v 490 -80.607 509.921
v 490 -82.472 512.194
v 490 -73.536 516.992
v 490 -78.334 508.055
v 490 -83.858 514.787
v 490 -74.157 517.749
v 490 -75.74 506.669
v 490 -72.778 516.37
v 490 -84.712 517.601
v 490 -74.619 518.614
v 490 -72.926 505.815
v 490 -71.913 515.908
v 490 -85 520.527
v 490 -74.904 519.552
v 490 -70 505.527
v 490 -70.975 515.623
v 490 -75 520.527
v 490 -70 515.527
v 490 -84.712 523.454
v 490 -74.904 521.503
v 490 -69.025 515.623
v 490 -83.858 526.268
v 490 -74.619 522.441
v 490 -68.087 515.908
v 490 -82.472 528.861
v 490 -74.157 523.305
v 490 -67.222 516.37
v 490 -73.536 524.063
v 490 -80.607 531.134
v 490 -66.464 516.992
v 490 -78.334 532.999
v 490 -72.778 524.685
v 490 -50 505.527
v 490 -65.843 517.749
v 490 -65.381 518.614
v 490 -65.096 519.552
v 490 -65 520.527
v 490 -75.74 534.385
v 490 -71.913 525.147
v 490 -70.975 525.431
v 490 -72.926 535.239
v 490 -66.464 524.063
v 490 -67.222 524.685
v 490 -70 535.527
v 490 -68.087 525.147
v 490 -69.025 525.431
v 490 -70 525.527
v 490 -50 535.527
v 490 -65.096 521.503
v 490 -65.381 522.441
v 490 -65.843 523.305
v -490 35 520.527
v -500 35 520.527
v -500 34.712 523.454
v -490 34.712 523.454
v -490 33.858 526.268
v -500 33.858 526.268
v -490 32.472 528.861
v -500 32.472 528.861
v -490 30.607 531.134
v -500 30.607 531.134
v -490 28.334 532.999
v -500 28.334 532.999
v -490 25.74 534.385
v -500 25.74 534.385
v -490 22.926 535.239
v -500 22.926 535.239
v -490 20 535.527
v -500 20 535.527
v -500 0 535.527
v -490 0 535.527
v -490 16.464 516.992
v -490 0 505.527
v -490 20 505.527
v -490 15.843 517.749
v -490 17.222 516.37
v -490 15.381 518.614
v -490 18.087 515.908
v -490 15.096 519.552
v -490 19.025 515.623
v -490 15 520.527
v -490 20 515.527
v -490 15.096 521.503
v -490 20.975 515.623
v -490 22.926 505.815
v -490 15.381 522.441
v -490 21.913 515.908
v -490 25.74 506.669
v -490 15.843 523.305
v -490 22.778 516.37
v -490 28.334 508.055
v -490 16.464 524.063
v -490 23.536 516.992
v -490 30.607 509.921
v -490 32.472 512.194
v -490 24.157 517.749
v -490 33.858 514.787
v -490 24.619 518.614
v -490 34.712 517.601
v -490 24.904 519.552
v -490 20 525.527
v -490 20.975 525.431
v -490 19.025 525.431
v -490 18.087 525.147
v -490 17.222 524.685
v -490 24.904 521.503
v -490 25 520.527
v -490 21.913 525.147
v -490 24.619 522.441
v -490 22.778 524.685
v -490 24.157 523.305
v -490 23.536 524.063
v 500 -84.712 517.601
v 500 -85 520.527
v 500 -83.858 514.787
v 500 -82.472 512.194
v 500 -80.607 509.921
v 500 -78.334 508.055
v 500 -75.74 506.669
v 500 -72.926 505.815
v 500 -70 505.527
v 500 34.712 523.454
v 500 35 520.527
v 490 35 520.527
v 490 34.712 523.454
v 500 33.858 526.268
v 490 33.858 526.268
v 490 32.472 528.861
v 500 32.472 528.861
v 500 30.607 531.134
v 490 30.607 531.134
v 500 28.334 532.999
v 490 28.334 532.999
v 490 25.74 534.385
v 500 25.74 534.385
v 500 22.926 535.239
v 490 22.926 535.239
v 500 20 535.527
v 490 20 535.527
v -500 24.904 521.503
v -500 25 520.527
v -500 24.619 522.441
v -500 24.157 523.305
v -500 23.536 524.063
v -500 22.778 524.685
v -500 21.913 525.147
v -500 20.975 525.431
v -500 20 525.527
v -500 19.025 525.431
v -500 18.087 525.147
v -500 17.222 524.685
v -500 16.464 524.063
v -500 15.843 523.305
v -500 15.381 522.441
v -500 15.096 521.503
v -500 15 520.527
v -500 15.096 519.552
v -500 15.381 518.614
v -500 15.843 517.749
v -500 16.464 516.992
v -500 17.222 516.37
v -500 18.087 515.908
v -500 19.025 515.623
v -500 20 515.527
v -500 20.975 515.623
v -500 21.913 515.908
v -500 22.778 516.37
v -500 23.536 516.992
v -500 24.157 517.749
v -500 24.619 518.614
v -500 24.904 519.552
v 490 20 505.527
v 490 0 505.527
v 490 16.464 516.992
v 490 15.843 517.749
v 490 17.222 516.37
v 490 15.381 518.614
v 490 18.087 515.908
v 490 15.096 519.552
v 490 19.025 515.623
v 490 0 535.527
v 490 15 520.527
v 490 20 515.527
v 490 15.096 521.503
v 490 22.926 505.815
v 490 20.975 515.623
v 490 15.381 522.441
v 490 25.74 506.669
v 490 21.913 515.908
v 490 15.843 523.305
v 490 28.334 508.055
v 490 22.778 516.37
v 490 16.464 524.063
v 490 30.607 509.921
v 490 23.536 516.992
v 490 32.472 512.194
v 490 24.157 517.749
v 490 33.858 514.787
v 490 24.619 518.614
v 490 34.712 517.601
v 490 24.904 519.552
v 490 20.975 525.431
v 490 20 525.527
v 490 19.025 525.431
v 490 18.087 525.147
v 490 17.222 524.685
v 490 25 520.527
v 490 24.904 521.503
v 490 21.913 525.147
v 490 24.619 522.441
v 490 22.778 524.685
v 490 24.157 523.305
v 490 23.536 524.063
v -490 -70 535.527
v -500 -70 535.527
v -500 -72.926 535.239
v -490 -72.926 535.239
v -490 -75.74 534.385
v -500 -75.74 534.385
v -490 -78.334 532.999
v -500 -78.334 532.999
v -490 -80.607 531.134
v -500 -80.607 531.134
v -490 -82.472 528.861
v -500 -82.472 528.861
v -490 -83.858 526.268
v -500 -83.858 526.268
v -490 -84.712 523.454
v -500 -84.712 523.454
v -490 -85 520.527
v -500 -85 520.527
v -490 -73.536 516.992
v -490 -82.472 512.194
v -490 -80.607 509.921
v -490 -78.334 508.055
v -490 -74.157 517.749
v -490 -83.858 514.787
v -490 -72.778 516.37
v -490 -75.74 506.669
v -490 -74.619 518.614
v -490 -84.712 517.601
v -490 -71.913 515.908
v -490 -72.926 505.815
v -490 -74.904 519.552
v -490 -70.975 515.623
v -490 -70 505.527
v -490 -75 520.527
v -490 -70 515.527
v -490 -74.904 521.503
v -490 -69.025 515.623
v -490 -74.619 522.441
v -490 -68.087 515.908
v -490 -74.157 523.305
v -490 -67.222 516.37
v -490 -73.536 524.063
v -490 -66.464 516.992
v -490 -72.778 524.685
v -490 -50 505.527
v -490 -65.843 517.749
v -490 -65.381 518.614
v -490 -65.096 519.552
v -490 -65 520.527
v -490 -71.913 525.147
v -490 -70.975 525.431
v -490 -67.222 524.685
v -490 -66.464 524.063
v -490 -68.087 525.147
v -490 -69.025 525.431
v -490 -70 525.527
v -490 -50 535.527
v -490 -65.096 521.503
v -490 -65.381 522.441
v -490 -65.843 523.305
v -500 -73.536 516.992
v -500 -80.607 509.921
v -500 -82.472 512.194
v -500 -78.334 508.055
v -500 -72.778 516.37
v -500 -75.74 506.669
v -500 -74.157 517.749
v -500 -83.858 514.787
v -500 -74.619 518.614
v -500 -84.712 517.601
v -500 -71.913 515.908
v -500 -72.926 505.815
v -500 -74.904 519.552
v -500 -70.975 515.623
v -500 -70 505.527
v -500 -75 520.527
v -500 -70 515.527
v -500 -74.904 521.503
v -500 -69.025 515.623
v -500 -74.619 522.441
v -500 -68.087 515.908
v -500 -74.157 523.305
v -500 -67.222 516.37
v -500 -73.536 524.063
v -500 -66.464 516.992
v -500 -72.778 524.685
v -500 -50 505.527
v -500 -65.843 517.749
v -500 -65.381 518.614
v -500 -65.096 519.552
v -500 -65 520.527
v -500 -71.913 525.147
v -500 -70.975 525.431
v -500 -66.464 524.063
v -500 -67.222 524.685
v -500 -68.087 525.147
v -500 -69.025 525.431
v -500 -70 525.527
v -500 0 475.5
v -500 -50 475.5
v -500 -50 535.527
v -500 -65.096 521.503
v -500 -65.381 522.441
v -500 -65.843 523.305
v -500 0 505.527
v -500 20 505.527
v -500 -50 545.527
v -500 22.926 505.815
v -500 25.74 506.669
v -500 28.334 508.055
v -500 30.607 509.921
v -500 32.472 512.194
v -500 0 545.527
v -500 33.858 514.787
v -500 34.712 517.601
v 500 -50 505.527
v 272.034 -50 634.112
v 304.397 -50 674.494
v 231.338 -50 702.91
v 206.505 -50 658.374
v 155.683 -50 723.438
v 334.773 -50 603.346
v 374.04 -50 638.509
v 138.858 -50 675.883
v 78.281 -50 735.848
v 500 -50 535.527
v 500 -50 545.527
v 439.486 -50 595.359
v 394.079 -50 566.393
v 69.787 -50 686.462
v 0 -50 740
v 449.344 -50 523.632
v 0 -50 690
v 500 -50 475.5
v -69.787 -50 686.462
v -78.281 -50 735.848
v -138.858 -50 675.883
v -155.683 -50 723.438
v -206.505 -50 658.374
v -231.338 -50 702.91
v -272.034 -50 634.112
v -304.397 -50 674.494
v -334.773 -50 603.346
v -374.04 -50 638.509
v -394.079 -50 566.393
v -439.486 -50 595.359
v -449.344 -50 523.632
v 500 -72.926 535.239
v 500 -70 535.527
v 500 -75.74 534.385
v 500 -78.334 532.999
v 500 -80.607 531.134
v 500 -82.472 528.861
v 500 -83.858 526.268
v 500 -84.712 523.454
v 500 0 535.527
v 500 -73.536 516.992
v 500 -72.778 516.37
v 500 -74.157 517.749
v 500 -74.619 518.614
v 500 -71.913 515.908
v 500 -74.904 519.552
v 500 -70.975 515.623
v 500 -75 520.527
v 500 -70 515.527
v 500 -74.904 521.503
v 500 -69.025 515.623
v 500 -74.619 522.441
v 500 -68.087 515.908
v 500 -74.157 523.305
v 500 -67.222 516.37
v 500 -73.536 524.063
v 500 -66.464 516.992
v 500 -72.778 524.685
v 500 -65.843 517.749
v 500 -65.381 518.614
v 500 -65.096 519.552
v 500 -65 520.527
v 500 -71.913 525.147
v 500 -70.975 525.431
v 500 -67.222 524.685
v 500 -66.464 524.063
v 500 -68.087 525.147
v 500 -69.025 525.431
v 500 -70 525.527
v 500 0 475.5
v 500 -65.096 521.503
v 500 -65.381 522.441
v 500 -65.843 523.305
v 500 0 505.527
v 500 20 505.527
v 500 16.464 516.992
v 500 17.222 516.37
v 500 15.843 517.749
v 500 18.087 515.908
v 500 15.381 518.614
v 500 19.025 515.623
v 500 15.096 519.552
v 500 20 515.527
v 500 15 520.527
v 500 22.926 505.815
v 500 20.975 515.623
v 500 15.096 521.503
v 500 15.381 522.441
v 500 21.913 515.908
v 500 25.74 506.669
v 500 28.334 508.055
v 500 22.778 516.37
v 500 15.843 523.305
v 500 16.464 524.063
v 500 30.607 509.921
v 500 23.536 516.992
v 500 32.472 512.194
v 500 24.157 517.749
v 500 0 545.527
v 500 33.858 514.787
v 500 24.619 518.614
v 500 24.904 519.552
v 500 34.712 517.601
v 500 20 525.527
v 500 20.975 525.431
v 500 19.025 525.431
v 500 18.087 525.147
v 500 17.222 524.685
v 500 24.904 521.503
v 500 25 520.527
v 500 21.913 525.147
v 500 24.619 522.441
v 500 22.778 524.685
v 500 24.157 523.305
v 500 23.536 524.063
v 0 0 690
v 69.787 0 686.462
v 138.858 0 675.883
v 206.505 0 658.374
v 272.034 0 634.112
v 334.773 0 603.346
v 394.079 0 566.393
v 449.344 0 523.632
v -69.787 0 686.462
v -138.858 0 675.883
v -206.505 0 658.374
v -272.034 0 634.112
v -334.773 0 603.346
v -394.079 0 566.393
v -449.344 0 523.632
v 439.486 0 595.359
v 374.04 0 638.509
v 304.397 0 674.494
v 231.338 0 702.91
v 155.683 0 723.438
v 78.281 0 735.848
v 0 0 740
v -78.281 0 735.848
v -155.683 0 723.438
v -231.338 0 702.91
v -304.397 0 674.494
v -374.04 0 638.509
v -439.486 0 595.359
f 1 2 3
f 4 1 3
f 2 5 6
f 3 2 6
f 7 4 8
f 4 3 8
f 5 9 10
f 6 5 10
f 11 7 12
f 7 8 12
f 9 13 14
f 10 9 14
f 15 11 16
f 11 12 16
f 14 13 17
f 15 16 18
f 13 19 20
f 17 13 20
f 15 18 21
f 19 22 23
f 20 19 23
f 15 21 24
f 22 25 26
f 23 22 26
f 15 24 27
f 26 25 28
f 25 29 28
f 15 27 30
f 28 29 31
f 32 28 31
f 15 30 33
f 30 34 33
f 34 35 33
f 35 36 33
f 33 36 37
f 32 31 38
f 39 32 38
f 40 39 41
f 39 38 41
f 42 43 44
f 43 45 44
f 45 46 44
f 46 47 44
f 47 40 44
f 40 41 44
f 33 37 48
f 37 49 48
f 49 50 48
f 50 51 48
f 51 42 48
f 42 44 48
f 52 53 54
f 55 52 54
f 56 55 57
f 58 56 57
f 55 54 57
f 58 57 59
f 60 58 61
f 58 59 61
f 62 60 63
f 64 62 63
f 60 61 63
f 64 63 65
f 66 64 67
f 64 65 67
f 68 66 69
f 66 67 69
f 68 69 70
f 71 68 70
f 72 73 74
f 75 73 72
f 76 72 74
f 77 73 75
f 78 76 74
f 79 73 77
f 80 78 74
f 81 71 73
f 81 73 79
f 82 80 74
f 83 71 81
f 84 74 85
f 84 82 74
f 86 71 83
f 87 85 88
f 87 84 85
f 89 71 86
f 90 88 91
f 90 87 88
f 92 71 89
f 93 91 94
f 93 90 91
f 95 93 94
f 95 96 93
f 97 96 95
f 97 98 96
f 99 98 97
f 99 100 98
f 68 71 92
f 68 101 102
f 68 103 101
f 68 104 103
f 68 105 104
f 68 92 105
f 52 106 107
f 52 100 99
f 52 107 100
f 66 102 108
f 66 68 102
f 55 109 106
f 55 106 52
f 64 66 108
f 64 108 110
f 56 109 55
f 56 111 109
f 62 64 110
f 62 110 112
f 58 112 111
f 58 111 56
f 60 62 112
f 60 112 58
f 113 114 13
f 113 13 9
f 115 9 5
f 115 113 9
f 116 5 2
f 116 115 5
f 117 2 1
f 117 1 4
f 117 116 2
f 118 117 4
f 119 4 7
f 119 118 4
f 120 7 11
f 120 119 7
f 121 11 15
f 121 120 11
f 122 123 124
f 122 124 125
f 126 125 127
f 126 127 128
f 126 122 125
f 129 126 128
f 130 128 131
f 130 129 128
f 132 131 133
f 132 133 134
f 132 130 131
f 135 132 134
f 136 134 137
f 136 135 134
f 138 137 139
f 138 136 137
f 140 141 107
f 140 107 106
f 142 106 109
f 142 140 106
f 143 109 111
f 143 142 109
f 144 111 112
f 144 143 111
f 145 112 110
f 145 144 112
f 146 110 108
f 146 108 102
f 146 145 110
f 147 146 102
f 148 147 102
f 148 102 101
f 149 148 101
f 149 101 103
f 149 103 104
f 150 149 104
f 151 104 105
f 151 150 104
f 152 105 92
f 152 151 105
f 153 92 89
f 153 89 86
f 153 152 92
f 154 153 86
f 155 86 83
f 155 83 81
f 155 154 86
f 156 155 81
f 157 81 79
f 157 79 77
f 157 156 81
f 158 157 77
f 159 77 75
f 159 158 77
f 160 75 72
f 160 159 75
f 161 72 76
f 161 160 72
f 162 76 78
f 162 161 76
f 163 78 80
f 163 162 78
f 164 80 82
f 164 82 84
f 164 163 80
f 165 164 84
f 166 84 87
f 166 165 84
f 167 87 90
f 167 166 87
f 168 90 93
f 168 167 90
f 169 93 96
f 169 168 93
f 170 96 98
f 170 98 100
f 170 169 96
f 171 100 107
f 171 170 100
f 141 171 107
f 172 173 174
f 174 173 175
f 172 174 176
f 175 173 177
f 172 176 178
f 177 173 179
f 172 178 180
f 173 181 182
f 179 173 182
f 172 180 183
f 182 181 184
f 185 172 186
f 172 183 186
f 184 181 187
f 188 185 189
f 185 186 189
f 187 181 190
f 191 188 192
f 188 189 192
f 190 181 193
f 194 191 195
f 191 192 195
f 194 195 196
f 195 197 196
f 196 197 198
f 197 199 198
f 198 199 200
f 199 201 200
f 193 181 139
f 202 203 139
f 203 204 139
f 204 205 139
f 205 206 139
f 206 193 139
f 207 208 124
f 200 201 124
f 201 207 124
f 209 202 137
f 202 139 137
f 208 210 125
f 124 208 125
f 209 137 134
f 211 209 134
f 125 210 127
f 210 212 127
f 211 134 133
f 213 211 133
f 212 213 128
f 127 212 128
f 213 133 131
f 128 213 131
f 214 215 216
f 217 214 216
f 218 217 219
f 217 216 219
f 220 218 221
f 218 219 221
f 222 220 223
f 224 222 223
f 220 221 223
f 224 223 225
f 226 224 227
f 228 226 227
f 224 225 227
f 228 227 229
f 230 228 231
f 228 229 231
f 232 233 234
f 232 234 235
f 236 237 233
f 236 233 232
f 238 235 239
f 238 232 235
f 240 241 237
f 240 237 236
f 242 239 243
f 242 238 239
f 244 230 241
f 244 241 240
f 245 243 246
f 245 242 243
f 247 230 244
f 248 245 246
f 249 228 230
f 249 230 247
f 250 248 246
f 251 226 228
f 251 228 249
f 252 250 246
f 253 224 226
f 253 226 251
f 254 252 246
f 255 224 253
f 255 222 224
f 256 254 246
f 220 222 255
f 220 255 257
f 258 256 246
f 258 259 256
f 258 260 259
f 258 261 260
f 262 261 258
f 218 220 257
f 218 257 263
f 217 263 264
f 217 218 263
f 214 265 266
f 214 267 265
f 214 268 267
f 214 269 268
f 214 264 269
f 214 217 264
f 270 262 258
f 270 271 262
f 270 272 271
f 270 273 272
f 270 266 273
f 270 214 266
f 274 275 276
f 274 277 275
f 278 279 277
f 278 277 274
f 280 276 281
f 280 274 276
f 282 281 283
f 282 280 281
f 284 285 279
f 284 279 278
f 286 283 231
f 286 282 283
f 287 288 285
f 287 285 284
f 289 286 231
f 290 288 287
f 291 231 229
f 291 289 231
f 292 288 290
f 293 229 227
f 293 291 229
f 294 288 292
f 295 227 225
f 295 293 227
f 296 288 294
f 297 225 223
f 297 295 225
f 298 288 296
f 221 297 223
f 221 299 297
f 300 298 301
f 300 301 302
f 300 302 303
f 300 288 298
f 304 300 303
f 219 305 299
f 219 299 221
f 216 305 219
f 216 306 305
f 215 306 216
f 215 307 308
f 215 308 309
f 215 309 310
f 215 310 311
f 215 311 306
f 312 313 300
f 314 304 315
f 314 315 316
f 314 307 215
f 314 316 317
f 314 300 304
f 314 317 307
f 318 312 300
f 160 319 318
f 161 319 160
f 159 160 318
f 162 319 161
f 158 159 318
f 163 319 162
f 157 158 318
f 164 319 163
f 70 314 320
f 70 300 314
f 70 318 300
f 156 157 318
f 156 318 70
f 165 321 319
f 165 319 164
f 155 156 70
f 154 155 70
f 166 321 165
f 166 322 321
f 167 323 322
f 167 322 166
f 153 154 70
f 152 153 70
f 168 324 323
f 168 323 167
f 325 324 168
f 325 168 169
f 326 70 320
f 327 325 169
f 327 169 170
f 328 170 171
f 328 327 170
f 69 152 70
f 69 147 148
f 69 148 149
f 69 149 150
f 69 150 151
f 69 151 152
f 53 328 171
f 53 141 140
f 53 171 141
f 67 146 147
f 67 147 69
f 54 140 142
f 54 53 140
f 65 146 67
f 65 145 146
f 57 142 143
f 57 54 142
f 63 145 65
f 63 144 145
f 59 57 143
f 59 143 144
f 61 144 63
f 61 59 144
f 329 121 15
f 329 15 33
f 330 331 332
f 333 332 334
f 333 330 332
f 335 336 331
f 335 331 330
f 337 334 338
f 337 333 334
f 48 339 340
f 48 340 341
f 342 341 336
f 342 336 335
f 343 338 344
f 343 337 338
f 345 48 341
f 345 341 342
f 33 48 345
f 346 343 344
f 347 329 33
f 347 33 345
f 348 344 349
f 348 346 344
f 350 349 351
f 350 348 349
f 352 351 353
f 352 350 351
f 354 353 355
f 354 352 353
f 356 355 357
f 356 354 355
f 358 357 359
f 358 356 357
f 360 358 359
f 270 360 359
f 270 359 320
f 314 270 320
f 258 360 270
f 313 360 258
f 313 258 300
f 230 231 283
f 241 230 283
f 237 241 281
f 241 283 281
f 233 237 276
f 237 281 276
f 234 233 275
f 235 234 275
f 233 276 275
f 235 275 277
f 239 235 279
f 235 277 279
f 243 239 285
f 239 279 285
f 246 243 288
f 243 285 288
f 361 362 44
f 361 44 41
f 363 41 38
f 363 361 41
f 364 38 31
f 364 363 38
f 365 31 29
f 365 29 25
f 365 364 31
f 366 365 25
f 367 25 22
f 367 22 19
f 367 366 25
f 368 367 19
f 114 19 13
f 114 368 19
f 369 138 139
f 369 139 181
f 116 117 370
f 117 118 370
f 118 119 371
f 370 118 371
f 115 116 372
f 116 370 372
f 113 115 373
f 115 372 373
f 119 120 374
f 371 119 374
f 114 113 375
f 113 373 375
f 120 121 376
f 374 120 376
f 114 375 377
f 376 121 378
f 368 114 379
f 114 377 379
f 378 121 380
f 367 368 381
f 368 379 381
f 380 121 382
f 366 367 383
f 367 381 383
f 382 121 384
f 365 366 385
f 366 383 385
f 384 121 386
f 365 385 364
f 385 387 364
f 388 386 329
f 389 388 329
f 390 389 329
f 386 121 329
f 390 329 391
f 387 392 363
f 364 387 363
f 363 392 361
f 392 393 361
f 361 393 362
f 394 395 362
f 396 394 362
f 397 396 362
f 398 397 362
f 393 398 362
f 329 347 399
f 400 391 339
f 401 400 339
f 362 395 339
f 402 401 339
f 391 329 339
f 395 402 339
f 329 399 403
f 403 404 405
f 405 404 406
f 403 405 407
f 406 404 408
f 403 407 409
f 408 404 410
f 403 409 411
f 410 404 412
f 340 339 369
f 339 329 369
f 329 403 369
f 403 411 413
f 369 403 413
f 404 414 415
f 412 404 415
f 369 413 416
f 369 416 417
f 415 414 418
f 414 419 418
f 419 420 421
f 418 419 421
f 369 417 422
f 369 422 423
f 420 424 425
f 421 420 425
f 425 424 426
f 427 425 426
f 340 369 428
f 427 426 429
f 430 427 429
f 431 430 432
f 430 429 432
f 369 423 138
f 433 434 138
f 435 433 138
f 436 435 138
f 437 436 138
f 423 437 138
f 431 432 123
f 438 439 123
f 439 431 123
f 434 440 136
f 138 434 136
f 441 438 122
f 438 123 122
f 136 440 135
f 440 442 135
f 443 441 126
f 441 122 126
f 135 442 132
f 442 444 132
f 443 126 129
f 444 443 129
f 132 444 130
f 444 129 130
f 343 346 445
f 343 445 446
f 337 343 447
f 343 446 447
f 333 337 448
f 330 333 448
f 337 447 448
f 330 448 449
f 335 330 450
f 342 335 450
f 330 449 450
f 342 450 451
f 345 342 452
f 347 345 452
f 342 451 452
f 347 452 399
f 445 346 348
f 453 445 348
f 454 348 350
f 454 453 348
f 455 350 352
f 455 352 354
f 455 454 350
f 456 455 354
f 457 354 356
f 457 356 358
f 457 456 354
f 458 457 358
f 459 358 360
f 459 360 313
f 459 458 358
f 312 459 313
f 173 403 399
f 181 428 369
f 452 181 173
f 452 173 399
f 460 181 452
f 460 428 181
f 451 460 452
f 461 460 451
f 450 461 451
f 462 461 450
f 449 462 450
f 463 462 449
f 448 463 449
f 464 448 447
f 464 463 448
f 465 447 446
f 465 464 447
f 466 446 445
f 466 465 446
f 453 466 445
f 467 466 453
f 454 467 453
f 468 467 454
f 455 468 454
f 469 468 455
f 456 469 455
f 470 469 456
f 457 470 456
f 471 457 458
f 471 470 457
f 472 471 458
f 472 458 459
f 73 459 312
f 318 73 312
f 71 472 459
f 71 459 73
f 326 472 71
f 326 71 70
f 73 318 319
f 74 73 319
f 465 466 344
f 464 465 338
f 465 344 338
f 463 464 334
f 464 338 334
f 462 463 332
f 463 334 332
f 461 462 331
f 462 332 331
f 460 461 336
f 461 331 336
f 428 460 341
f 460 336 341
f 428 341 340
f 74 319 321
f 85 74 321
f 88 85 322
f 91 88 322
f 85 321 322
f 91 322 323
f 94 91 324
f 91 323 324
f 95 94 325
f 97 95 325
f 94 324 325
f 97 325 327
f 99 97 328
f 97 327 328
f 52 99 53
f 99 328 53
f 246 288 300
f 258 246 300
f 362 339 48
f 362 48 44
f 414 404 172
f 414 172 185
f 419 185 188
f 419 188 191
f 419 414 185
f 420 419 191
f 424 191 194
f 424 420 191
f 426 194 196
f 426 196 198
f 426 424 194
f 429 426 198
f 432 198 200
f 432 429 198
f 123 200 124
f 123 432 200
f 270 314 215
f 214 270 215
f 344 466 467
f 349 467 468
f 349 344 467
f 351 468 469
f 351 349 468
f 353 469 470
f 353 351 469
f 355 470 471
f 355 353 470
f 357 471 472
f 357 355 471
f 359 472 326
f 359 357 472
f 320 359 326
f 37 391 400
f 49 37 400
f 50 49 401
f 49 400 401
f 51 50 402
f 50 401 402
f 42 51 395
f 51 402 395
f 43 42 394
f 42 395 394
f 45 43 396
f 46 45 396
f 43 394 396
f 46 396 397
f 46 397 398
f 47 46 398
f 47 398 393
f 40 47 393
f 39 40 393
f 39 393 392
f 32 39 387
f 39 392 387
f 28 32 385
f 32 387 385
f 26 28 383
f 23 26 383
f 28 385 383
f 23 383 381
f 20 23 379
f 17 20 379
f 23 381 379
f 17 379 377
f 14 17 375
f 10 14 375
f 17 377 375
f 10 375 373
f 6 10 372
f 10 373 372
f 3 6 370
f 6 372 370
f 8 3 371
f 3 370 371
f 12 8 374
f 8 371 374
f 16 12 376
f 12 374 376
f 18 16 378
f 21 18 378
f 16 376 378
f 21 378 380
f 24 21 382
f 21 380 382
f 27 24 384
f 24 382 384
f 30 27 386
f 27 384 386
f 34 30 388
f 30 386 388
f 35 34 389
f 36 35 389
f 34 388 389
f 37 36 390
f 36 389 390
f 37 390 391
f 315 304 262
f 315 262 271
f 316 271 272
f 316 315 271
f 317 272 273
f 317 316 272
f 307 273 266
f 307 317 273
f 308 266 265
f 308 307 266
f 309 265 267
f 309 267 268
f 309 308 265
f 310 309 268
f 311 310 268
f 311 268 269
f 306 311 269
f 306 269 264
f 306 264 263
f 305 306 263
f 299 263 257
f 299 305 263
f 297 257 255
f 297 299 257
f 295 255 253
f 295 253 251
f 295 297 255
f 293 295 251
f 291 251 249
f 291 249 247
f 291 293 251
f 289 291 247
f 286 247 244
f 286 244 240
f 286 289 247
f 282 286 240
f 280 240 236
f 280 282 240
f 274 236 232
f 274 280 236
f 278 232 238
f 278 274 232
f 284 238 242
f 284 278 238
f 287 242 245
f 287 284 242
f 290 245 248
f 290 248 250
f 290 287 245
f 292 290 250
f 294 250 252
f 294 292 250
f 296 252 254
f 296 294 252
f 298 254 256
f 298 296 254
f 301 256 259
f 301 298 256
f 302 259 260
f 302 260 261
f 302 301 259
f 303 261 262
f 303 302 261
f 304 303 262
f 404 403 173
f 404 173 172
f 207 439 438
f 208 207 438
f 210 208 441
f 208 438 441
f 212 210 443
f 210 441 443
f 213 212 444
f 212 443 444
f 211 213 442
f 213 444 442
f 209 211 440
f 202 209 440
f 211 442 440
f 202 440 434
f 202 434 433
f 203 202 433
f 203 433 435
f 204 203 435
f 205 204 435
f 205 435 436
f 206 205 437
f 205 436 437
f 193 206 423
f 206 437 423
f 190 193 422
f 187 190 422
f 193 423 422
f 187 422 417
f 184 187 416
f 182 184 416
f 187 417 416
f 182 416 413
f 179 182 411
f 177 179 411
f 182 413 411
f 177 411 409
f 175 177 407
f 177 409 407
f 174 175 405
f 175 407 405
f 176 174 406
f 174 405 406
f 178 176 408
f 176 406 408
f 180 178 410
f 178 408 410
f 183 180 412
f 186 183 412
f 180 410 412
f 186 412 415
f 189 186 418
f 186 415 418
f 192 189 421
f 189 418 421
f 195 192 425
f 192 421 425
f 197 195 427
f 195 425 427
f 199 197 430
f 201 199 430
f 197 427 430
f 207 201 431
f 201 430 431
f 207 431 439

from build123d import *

# Parameters (mm, degrees)
F1_W     = 50
F1_H     = 50
F3_W     = 64.371526
F3_H     = 133.521259
F4_DEPTH = 91
F5_R     = 5
F6_DEPTH = 10


with BuildPart() as f2:
    # F2: sweep along a path in F0
    with BuildLine(Plane.XZ) as f2_path:
        ThreePointArc((0, 690), (272.034172, 634.111512), (500, 475.499737))
    # F1 (on Right) → F2 (sweep)
    with BuildSketch(Plane.YZ):
        with Locations((-25, 715)):
            Rectangle(F1_W, F1_H)
    sweep(path=f2_path.line)

    # F3 (on Front) → F4 (cut)
    with BuildSketch(Plane.XZ):
        with Locations((532.185763, 516.52947)):
            Rectangle(F3_W, F3_H)
    extrude(amount=F4_DEPTH, mode=Mode.SUBTRACT)

    # F5 (on face) → F6 (join)
    with BuildSketch(Plane.YZ.offset(500)):
        with BuildLine():
            Line((-50, 505.527268), (-50, 535.527268))
            Line((-50, 535.527268), (-70, 535.527268))
            ThreePointArc((-70, 535.527268), (-80.606602, 531.13387), (-85, 520.527268))
            ThreePointArc((-85, 520.527268), (-80.606602, 509.920666), (-70, 505.527268))
            Line((-70, 505.527268), (-50, 505.527268))
        make_face()
        with Locations((-70, 520.527268)):
            Circle(F5_R, mode=Mode.SUBTRACT)
        with BuildLine():
            Line((20, 535.527268), (0, 535.527268))
            Line((0, 535.527268), (0, 505.527268))
            Line((0, 505.527268), (20, 505.527268))
            ThreePointArc((20, 505.527268), (30.606602, 509.920666), (35, 520.527268))
            ThreePointArc((35, 520.527268), (30.606602, 531.13387), (20, 535.527268))
        make_face()
        with Locations((20, 520.527268)):
            Circle(F5_R, mode=Mode.SUBTRACT)
    extrude(amount=-F6_DEPTH)

    # F7: F2 across face


with BuildPart() as f2_1:
    add(f2.part)
    add(f2.part.mirror(Plane(origin=(0, -25, 715), x_dir=(0, -1, 0), z_dir=(-1, 0, 0))))


solid = f2_1.part
